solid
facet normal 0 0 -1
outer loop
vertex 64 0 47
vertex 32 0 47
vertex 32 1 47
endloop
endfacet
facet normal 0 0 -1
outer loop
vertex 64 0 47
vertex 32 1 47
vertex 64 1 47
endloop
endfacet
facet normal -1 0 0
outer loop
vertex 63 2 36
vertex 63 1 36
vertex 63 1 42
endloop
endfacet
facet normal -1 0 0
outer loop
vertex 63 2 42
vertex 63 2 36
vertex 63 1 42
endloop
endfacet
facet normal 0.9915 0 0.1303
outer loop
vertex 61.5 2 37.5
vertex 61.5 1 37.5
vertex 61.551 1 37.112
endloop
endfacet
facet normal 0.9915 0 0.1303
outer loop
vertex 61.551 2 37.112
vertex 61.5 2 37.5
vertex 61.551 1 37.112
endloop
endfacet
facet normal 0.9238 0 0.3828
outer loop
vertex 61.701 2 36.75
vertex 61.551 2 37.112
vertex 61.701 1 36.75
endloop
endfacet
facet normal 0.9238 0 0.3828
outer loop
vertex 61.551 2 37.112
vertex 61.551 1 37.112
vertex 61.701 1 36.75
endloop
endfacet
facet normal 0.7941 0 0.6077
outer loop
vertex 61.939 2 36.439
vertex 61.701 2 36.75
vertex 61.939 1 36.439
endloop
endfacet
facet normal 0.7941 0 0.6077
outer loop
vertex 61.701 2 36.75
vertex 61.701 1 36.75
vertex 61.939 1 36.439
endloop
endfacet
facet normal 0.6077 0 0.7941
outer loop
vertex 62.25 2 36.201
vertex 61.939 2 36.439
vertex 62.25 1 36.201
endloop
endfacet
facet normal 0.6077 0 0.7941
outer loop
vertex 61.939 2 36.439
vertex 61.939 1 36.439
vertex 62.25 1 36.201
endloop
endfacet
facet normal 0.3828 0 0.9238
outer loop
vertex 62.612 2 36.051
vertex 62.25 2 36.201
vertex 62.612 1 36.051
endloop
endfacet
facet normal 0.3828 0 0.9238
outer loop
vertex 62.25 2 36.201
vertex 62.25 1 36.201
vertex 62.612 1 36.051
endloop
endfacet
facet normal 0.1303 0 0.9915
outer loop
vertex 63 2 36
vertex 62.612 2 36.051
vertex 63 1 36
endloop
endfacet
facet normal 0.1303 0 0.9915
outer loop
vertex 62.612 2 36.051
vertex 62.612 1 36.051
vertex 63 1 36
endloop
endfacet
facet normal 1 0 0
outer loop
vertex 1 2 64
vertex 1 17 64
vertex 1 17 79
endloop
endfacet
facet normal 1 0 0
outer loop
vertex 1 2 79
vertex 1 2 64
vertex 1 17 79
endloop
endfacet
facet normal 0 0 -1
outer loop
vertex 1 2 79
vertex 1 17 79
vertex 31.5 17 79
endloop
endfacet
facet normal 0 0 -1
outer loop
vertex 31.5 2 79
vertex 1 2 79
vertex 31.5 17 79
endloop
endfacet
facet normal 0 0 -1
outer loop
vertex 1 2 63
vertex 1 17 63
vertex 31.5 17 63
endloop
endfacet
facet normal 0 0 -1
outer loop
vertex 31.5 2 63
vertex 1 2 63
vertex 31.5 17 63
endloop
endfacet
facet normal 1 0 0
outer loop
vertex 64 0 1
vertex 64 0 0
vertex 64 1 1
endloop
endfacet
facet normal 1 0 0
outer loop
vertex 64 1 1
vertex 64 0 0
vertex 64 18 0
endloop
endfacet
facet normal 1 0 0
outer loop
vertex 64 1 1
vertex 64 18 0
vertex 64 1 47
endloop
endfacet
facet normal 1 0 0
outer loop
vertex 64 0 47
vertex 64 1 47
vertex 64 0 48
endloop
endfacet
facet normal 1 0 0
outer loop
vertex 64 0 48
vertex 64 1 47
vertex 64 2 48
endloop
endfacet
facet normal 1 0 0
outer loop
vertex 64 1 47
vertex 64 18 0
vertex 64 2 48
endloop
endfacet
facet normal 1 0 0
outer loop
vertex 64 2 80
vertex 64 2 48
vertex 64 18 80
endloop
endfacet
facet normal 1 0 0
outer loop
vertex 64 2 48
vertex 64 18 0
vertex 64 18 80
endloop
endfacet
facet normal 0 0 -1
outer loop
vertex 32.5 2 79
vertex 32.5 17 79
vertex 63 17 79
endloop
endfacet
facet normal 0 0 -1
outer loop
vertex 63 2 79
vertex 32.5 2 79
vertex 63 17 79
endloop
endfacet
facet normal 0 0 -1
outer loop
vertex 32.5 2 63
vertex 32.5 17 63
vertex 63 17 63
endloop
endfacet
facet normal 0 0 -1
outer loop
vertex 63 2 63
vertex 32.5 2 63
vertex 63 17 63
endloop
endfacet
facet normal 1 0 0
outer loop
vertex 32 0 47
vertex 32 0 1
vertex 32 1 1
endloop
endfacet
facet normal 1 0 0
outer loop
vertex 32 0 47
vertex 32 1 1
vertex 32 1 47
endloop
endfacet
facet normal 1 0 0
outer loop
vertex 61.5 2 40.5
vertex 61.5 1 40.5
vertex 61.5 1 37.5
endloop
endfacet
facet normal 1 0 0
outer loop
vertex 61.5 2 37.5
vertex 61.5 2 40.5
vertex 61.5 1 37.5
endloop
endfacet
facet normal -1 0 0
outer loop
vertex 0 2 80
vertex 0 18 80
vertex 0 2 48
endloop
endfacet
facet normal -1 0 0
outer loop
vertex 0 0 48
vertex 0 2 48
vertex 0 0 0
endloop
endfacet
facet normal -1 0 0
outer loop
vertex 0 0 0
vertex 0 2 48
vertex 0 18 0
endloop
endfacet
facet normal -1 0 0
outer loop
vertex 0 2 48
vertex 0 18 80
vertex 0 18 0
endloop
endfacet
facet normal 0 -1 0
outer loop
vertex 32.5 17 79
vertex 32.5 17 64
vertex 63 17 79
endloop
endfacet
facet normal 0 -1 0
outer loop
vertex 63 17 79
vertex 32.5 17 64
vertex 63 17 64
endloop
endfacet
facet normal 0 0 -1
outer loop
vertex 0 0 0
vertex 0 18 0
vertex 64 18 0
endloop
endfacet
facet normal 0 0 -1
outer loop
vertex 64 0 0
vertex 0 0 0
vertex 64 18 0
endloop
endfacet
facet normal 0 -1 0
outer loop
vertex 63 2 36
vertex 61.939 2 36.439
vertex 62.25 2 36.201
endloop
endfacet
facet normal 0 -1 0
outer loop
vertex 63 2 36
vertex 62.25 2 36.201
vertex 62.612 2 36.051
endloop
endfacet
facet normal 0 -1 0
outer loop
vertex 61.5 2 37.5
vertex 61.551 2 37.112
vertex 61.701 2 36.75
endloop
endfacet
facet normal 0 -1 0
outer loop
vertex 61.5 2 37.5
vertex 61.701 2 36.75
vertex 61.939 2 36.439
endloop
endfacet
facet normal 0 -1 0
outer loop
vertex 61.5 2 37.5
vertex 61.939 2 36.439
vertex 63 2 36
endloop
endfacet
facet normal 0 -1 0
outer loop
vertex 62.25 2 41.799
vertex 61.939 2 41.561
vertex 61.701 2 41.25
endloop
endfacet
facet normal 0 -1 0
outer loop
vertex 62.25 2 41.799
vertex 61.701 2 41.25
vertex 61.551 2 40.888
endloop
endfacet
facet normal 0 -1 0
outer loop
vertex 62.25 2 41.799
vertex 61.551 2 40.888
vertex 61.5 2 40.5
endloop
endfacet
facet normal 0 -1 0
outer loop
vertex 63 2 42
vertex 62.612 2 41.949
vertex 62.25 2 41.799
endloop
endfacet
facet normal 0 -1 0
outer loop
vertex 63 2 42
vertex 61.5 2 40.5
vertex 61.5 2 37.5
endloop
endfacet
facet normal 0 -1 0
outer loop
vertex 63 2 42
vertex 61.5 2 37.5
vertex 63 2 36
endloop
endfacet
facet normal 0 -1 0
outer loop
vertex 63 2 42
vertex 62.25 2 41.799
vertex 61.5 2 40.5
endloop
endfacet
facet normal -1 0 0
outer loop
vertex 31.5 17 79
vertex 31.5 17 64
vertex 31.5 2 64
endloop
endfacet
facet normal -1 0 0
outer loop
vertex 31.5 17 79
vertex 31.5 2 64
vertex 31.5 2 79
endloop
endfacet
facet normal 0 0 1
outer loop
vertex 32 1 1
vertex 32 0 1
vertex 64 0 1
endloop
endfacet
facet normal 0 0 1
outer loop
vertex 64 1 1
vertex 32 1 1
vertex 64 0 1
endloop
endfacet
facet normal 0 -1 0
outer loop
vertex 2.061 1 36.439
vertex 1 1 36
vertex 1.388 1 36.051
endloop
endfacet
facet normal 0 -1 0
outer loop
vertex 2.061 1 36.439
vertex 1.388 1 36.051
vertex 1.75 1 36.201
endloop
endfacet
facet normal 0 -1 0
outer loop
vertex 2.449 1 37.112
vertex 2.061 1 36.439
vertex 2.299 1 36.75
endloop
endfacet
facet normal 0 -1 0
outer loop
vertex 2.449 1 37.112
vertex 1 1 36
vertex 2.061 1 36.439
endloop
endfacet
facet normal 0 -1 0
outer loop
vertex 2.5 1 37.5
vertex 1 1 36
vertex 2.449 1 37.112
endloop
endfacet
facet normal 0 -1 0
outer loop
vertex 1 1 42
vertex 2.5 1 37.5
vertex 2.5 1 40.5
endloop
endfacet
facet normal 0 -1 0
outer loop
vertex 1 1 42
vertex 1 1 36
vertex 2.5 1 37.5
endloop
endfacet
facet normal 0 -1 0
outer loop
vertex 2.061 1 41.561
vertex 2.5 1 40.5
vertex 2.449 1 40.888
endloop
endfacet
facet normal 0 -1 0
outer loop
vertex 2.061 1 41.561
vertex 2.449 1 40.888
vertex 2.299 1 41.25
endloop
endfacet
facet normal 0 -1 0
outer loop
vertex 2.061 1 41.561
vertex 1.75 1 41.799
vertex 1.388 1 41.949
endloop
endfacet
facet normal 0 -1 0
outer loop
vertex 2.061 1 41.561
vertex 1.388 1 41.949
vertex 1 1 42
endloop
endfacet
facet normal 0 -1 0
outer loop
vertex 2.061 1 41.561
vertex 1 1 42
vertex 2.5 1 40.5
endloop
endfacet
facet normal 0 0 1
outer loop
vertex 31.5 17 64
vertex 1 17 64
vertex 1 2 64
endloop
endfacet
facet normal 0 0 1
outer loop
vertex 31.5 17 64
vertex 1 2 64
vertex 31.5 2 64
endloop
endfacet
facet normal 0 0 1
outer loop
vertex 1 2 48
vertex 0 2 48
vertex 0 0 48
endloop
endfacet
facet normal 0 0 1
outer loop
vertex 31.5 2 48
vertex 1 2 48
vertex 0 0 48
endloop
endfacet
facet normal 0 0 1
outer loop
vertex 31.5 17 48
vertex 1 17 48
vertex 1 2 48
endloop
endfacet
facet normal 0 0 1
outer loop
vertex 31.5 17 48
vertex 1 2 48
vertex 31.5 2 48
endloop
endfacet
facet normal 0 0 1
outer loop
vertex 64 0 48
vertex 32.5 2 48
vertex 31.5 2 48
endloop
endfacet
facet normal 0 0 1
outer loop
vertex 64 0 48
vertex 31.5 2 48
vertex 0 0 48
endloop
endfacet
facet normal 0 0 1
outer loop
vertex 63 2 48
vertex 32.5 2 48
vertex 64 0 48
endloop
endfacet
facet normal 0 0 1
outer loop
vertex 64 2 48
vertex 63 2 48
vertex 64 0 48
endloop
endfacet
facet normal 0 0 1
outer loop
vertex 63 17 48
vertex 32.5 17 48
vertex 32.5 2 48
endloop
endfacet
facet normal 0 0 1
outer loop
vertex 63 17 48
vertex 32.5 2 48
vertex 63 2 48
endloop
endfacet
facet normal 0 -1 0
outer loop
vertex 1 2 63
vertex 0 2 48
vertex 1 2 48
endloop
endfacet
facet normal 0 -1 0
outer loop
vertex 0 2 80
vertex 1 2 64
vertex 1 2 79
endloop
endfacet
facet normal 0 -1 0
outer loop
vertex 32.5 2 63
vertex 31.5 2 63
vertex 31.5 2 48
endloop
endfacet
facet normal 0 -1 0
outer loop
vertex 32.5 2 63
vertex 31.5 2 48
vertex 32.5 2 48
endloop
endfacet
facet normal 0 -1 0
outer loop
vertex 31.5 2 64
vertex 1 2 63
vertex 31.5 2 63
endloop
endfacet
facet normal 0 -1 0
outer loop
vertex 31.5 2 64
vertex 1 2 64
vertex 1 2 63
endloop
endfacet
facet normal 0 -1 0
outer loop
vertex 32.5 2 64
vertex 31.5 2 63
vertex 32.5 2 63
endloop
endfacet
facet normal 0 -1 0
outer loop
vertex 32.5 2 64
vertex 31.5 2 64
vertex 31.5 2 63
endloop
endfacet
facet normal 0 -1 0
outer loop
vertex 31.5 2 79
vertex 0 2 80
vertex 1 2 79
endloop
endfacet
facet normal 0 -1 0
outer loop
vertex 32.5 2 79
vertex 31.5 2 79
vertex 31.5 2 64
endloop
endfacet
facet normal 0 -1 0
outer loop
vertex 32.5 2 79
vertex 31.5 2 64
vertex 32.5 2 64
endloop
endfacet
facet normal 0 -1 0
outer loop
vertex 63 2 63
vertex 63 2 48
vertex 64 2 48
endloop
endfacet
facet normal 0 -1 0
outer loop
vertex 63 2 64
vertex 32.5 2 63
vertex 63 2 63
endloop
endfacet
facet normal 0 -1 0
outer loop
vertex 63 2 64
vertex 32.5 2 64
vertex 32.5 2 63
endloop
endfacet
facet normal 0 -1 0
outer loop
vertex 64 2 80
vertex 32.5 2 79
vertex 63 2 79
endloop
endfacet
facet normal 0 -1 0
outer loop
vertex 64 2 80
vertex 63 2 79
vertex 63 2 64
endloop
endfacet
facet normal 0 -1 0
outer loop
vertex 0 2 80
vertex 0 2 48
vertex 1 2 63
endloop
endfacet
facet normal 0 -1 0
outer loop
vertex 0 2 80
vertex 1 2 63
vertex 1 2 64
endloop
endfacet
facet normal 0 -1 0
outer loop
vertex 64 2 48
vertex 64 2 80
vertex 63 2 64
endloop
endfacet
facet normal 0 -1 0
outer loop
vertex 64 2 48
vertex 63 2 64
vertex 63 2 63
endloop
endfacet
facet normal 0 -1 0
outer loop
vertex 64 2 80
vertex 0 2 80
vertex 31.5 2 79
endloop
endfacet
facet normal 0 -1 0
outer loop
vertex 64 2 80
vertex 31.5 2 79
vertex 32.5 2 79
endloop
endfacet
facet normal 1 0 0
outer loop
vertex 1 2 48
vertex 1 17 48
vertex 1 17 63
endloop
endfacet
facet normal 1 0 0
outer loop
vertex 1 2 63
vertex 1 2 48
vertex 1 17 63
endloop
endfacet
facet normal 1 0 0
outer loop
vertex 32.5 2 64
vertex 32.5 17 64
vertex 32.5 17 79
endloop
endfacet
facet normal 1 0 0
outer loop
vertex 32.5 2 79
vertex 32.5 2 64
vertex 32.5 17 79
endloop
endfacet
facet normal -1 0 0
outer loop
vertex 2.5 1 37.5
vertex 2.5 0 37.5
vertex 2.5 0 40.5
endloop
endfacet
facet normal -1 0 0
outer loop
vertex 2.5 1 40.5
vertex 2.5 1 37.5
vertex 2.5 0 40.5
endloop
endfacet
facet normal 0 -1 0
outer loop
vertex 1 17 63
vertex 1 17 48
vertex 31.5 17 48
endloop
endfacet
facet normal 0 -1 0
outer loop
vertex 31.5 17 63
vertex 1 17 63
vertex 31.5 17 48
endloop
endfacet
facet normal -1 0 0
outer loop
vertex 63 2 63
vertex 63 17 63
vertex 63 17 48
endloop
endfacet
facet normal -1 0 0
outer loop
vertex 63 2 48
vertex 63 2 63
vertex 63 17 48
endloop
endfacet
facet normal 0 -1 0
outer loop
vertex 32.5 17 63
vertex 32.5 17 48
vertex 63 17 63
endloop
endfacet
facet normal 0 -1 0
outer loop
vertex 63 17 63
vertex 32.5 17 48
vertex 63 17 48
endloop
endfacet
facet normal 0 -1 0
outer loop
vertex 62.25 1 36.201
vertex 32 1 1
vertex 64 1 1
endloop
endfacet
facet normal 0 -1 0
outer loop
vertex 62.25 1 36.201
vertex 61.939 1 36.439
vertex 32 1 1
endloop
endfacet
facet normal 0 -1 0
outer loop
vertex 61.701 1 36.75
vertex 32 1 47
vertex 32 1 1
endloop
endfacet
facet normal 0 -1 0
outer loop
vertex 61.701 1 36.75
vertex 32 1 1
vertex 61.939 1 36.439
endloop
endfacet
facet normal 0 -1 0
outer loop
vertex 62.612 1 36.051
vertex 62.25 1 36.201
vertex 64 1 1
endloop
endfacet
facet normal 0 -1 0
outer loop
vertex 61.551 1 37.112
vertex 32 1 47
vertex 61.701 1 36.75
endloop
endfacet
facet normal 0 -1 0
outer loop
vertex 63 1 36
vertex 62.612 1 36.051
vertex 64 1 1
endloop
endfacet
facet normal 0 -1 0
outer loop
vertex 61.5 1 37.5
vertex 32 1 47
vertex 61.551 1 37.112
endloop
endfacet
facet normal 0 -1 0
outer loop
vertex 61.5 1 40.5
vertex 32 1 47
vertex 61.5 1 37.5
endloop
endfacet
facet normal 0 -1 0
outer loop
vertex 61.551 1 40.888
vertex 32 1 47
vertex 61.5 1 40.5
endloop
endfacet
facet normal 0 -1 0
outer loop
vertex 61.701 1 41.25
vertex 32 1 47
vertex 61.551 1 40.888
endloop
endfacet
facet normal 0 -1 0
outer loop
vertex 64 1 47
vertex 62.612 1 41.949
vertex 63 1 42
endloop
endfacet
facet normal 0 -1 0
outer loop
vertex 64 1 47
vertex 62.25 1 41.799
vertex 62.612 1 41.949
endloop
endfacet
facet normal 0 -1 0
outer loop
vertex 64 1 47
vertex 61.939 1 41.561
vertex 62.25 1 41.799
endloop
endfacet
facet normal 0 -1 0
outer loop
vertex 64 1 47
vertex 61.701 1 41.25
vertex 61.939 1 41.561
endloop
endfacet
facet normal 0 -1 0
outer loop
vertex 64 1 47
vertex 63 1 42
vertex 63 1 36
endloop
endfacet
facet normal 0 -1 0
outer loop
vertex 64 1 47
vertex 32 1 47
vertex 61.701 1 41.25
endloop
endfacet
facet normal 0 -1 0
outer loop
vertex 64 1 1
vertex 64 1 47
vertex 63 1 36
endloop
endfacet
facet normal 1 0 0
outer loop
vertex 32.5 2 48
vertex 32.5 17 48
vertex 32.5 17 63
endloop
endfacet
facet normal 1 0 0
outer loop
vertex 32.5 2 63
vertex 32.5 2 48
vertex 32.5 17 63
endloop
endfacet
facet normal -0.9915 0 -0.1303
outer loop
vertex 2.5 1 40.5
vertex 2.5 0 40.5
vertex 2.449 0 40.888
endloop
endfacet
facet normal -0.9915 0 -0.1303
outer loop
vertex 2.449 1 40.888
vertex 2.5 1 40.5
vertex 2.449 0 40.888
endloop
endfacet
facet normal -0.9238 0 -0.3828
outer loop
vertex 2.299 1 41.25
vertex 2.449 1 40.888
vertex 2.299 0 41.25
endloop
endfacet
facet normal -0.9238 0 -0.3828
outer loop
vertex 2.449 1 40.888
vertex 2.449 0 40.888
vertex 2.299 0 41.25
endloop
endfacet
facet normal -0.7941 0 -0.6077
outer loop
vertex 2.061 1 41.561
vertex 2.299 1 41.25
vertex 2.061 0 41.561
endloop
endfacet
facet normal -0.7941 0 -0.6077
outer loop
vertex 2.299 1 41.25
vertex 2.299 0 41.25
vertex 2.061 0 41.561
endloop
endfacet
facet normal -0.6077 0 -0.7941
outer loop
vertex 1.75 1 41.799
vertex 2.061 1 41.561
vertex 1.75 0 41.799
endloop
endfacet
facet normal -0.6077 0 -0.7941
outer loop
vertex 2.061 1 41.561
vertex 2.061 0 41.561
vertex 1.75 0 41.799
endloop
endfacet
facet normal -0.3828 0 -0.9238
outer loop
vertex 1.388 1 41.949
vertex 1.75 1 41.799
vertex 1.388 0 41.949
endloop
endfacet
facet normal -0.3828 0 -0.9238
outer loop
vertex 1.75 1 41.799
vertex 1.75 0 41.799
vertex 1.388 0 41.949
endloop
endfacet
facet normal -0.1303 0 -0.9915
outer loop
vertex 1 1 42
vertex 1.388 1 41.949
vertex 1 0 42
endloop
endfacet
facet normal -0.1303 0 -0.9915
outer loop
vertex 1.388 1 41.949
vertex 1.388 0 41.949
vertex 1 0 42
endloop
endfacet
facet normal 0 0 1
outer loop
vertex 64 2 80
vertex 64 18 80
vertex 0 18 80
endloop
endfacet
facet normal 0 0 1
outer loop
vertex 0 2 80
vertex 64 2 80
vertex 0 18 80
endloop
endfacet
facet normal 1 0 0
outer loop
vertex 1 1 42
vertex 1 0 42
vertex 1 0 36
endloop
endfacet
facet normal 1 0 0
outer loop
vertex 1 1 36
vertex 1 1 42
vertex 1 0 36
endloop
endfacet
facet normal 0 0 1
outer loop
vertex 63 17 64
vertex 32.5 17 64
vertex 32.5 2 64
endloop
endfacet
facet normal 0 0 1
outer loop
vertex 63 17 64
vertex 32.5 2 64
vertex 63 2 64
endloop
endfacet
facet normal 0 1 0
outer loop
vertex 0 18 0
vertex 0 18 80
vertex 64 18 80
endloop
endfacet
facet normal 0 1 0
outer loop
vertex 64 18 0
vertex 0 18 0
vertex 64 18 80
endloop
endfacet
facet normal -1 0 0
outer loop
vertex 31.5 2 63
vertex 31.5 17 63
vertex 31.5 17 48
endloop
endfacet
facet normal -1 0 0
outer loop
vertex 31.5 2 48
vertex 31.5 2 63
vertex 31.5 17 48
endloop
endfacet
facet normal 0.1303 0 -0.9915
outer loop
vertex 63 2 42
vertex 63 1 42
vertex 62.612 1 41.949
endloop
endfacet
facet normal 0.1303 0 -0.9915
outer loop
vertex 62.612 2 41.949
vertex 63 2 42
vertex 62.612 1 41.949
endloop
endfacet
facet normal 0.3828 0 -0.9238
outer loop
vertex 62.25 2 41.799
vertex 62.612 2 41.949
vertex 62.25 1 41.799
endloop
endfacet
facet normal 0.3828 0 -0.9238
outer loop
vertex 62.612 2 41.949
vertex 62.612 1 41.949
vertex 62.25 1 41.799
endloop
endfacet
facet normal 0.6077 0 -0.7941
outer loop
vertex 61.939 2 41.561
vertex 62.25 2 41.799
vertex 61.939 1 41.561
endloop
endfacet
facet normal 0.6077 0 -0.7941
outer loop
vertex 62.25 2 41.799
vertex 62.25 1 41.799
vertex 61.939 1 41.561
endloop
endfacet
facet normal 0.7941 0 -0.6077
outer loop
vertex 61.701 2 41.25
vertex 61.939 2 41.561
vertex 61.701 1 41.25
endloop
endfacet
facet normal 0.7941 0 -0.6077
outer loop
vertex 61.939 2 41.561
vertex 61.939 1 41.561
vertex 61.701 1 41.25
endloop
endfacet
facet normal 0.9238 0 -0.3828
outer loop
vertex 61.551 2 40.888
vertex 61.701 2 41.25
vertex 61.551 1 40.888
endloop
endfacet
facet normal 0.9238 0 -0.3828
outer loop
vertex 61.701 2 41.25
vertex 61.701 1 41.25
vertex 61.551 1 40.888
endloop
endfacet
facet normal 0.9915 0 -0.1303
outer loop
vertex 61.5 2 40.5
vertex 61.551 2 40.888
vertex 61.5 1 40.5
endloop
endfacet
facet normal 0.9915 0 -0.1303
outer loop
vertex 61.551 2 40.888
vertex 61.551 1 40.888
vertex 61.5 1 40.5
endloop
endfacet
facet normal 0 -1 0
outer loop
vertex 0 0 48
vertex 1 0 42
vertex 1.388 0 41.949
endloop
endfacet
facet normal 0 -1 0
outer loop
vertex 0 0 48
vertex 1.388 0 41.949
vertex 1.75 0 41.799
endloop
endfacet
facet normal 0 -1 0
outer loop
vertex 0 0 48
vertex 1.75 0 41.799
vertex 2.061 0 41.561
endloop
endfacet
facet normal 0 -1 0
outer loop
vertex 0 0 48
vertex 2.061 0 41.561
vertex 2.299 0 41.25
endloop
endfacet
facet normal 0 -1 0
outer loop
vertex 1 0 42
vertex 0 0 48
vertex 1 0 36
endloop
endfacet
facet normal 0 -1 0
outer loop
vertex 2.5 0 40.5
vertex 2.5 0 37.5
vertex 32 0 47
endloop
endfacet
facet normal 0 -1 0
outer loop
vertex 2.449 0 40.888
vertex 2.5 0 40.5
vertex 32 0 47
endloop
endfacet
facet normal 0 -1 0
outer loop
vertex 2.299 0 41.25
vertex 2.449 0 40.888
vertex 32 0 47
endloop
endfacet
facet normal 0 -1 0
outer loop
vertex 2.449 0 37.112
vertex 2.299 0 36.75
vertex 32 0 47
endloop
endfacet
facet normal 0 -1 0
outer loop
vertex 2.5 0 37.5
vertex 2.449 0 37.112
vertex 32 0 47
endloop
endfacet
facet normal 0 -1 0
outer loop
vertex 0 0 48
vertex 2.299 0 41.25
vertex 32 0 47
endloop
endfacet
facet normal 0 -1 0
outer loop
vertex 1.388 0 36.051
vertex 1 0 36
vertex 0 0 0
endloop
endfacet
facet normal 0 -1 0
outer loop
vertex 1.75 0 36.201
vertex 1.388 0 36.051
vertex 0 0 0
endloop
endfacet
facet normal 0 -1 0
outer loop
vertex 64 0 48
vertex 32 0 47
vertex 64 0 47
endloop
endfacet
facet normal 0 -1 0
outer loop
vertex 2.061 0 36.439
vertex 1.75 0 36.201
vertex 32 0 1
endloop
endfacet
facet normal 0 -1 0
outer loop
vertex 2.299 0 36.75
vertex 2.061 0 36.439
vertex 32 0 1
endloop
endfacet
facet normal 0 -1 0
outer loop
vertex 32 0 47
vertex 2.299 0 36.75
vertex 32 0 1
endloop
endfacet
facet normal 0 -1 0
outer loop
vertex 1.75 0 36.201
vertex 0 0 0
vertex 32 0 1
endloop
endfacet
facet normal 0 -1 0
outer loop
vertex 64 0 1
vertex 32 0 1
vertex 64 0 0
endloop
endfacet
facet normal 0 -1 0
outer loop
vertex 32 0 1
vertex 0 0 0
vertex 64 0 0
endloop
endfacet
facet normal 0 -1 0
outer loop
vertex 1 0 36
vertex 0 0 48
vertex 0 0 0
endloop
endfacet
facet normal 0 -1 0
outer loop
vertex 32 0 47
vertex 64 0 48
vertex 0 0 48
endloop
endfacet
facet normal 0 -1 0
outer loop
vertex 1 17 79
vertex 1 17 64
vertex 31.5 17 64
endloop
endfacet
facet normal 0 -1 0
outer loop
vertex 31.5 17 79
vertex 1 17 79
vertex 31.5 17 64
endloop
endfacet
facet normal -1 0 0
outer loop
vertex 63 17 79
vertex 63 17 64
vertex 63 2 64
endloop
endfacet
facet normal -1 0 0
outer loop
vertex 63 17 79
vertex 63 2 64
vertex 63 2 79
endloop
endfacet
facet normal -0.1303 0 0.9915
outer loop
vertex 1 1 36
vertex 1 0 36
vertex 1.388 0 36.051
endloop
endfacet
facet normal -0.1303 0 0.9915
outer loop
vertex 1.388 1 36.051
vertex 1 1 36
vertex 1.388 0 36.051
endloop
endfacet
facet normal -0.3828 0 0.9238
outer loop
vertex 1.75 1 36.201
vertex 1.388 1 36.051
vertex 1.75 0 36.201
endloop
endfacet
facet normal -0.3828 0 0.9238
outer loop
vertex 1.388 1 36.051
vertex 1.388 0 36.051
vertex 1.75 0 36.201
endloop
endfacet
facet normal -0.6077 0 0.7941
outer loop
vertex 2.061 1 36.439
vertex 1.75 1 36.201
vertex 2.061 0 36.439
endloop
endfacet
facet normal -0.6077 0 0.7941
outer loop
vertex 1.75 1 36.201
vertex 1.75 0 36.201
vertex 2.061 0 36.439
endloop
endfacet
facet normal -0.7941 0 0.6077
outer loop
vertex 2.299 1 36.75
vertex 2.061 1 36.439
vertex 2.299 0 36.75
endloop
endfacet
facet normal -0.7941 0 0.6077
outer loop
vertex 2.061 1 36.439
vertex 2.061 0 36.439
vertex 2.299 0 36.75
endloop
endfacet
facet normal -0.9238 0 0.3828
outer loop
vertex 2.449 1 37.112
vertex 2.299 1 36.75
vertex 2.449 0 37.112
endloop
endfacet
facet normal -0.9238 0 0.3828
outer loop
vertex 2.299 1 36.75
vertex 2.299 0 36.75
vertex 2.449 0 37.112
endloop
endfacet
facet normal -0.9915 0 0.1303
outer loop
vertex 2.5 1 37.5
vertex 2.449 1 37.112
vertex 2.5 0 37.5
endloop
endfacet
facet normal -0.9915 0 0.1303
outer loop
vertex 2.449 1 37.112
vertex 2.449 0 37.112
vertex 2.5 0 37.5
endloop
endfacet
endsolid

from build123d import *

# Parameters (mm, degrees)
F0_W      = 64
F0_H      = 18
F1_DEPTH  = 48
F2_W      = 64
F2_H      = 1
F3_DEPTH  = 32
F4_W      = 30.5
F4_H      = 15
F5_DEPTH  = 15
F6_W      = 32
F6_H      = 46
F7_DEPTH  = 1
F9_DEPTH  = 1
F11_DEPTH = 1


with BuildPart() as f1:
    # F0 (on Top) → F1 (new body)
    with BuildSketch(Plane.XY):
        with Locations((32, 9)):
            Rectangle(F0_W, F0_H)
    extrude(amount=F1_DEPTH)

    # F2 (on face) → F3 (join)
    with BuildSketch(Plane.XY.offset(48)):
        with Locations((32, 17.5)):
            Rectangle(F2_W, F2_H)
    extrude(amount=F3_DEPTH)

    # F4 (on face) → F5 (join)
    with BuildSketch(Plane.XZ.offset(-17)):
        Polygon((1, 80), (0, 80), (0, 79), (0, 64), (0, 63), (0, 48), (1, 48), (1, 63), (31.5, 63), (31.5, 48), (32.5, 48), (32.5, 63), (63, 63), (63, 48), (64, 48), (64, 79), (64, 80), (63, 80), (32.5, 80), (31.5, 80), align=None)
        with Locations((16.25, 71.5)):
            Rectangle(F4_W, F4_H, mode=Mode.SUBTRACT)
        with Locations((47.75, 71.5)):
            Rectangle(F4_W, F4_H, mode=Mode.SUBTRACT)
    extrude(amount=F5_DEPTH)

    # F6 (on face) → F7 (cut)
    with BuildSketch(Plane.XZ):
        with Locations((48, 24)):
            Rectangle(F6_W, F6_H)
    extrude(amount=-F7_DEPTH, mode=Mode.SUBTRACT)

    # F8 (on face) → F9 (cut)
    with BuildSketch(Plane.XZ.offset(-1)):
        with BuildLine():
            ThreePointArc((63, 42), (61.93934, 41.56066), (61.5, 40.5))
            Line((61.5, 40.5), (61.5, 37.5))
            ThreePointArc((61.5, 37.5), (61.93934, 36.43934), (63, 36))
            Line((63, 36), (63, 42))
        make_face()
    extrude(amount=-F9_DEPTH, mode=Mode.SUBTRACT)

    # F10 (on face) → F11 (cut)
    with BuildSketch(Plane.XZ):
        with BuildLine():
            ThreePointArc((2.5, 40.5), (2.06066, 41.56066), (1, 42))
            Line((1, 42), (1, 36))
            ThreePointArc((1, 36), (2.06066, 36.43934), (2.5, 37.5))
            Line((2.5, 37.5), (2.5, 40.5))
        make_face()
    extrude(amount=-F11_DEPTH, mode=Mode.SUBTRACT)


solid = f1.part
